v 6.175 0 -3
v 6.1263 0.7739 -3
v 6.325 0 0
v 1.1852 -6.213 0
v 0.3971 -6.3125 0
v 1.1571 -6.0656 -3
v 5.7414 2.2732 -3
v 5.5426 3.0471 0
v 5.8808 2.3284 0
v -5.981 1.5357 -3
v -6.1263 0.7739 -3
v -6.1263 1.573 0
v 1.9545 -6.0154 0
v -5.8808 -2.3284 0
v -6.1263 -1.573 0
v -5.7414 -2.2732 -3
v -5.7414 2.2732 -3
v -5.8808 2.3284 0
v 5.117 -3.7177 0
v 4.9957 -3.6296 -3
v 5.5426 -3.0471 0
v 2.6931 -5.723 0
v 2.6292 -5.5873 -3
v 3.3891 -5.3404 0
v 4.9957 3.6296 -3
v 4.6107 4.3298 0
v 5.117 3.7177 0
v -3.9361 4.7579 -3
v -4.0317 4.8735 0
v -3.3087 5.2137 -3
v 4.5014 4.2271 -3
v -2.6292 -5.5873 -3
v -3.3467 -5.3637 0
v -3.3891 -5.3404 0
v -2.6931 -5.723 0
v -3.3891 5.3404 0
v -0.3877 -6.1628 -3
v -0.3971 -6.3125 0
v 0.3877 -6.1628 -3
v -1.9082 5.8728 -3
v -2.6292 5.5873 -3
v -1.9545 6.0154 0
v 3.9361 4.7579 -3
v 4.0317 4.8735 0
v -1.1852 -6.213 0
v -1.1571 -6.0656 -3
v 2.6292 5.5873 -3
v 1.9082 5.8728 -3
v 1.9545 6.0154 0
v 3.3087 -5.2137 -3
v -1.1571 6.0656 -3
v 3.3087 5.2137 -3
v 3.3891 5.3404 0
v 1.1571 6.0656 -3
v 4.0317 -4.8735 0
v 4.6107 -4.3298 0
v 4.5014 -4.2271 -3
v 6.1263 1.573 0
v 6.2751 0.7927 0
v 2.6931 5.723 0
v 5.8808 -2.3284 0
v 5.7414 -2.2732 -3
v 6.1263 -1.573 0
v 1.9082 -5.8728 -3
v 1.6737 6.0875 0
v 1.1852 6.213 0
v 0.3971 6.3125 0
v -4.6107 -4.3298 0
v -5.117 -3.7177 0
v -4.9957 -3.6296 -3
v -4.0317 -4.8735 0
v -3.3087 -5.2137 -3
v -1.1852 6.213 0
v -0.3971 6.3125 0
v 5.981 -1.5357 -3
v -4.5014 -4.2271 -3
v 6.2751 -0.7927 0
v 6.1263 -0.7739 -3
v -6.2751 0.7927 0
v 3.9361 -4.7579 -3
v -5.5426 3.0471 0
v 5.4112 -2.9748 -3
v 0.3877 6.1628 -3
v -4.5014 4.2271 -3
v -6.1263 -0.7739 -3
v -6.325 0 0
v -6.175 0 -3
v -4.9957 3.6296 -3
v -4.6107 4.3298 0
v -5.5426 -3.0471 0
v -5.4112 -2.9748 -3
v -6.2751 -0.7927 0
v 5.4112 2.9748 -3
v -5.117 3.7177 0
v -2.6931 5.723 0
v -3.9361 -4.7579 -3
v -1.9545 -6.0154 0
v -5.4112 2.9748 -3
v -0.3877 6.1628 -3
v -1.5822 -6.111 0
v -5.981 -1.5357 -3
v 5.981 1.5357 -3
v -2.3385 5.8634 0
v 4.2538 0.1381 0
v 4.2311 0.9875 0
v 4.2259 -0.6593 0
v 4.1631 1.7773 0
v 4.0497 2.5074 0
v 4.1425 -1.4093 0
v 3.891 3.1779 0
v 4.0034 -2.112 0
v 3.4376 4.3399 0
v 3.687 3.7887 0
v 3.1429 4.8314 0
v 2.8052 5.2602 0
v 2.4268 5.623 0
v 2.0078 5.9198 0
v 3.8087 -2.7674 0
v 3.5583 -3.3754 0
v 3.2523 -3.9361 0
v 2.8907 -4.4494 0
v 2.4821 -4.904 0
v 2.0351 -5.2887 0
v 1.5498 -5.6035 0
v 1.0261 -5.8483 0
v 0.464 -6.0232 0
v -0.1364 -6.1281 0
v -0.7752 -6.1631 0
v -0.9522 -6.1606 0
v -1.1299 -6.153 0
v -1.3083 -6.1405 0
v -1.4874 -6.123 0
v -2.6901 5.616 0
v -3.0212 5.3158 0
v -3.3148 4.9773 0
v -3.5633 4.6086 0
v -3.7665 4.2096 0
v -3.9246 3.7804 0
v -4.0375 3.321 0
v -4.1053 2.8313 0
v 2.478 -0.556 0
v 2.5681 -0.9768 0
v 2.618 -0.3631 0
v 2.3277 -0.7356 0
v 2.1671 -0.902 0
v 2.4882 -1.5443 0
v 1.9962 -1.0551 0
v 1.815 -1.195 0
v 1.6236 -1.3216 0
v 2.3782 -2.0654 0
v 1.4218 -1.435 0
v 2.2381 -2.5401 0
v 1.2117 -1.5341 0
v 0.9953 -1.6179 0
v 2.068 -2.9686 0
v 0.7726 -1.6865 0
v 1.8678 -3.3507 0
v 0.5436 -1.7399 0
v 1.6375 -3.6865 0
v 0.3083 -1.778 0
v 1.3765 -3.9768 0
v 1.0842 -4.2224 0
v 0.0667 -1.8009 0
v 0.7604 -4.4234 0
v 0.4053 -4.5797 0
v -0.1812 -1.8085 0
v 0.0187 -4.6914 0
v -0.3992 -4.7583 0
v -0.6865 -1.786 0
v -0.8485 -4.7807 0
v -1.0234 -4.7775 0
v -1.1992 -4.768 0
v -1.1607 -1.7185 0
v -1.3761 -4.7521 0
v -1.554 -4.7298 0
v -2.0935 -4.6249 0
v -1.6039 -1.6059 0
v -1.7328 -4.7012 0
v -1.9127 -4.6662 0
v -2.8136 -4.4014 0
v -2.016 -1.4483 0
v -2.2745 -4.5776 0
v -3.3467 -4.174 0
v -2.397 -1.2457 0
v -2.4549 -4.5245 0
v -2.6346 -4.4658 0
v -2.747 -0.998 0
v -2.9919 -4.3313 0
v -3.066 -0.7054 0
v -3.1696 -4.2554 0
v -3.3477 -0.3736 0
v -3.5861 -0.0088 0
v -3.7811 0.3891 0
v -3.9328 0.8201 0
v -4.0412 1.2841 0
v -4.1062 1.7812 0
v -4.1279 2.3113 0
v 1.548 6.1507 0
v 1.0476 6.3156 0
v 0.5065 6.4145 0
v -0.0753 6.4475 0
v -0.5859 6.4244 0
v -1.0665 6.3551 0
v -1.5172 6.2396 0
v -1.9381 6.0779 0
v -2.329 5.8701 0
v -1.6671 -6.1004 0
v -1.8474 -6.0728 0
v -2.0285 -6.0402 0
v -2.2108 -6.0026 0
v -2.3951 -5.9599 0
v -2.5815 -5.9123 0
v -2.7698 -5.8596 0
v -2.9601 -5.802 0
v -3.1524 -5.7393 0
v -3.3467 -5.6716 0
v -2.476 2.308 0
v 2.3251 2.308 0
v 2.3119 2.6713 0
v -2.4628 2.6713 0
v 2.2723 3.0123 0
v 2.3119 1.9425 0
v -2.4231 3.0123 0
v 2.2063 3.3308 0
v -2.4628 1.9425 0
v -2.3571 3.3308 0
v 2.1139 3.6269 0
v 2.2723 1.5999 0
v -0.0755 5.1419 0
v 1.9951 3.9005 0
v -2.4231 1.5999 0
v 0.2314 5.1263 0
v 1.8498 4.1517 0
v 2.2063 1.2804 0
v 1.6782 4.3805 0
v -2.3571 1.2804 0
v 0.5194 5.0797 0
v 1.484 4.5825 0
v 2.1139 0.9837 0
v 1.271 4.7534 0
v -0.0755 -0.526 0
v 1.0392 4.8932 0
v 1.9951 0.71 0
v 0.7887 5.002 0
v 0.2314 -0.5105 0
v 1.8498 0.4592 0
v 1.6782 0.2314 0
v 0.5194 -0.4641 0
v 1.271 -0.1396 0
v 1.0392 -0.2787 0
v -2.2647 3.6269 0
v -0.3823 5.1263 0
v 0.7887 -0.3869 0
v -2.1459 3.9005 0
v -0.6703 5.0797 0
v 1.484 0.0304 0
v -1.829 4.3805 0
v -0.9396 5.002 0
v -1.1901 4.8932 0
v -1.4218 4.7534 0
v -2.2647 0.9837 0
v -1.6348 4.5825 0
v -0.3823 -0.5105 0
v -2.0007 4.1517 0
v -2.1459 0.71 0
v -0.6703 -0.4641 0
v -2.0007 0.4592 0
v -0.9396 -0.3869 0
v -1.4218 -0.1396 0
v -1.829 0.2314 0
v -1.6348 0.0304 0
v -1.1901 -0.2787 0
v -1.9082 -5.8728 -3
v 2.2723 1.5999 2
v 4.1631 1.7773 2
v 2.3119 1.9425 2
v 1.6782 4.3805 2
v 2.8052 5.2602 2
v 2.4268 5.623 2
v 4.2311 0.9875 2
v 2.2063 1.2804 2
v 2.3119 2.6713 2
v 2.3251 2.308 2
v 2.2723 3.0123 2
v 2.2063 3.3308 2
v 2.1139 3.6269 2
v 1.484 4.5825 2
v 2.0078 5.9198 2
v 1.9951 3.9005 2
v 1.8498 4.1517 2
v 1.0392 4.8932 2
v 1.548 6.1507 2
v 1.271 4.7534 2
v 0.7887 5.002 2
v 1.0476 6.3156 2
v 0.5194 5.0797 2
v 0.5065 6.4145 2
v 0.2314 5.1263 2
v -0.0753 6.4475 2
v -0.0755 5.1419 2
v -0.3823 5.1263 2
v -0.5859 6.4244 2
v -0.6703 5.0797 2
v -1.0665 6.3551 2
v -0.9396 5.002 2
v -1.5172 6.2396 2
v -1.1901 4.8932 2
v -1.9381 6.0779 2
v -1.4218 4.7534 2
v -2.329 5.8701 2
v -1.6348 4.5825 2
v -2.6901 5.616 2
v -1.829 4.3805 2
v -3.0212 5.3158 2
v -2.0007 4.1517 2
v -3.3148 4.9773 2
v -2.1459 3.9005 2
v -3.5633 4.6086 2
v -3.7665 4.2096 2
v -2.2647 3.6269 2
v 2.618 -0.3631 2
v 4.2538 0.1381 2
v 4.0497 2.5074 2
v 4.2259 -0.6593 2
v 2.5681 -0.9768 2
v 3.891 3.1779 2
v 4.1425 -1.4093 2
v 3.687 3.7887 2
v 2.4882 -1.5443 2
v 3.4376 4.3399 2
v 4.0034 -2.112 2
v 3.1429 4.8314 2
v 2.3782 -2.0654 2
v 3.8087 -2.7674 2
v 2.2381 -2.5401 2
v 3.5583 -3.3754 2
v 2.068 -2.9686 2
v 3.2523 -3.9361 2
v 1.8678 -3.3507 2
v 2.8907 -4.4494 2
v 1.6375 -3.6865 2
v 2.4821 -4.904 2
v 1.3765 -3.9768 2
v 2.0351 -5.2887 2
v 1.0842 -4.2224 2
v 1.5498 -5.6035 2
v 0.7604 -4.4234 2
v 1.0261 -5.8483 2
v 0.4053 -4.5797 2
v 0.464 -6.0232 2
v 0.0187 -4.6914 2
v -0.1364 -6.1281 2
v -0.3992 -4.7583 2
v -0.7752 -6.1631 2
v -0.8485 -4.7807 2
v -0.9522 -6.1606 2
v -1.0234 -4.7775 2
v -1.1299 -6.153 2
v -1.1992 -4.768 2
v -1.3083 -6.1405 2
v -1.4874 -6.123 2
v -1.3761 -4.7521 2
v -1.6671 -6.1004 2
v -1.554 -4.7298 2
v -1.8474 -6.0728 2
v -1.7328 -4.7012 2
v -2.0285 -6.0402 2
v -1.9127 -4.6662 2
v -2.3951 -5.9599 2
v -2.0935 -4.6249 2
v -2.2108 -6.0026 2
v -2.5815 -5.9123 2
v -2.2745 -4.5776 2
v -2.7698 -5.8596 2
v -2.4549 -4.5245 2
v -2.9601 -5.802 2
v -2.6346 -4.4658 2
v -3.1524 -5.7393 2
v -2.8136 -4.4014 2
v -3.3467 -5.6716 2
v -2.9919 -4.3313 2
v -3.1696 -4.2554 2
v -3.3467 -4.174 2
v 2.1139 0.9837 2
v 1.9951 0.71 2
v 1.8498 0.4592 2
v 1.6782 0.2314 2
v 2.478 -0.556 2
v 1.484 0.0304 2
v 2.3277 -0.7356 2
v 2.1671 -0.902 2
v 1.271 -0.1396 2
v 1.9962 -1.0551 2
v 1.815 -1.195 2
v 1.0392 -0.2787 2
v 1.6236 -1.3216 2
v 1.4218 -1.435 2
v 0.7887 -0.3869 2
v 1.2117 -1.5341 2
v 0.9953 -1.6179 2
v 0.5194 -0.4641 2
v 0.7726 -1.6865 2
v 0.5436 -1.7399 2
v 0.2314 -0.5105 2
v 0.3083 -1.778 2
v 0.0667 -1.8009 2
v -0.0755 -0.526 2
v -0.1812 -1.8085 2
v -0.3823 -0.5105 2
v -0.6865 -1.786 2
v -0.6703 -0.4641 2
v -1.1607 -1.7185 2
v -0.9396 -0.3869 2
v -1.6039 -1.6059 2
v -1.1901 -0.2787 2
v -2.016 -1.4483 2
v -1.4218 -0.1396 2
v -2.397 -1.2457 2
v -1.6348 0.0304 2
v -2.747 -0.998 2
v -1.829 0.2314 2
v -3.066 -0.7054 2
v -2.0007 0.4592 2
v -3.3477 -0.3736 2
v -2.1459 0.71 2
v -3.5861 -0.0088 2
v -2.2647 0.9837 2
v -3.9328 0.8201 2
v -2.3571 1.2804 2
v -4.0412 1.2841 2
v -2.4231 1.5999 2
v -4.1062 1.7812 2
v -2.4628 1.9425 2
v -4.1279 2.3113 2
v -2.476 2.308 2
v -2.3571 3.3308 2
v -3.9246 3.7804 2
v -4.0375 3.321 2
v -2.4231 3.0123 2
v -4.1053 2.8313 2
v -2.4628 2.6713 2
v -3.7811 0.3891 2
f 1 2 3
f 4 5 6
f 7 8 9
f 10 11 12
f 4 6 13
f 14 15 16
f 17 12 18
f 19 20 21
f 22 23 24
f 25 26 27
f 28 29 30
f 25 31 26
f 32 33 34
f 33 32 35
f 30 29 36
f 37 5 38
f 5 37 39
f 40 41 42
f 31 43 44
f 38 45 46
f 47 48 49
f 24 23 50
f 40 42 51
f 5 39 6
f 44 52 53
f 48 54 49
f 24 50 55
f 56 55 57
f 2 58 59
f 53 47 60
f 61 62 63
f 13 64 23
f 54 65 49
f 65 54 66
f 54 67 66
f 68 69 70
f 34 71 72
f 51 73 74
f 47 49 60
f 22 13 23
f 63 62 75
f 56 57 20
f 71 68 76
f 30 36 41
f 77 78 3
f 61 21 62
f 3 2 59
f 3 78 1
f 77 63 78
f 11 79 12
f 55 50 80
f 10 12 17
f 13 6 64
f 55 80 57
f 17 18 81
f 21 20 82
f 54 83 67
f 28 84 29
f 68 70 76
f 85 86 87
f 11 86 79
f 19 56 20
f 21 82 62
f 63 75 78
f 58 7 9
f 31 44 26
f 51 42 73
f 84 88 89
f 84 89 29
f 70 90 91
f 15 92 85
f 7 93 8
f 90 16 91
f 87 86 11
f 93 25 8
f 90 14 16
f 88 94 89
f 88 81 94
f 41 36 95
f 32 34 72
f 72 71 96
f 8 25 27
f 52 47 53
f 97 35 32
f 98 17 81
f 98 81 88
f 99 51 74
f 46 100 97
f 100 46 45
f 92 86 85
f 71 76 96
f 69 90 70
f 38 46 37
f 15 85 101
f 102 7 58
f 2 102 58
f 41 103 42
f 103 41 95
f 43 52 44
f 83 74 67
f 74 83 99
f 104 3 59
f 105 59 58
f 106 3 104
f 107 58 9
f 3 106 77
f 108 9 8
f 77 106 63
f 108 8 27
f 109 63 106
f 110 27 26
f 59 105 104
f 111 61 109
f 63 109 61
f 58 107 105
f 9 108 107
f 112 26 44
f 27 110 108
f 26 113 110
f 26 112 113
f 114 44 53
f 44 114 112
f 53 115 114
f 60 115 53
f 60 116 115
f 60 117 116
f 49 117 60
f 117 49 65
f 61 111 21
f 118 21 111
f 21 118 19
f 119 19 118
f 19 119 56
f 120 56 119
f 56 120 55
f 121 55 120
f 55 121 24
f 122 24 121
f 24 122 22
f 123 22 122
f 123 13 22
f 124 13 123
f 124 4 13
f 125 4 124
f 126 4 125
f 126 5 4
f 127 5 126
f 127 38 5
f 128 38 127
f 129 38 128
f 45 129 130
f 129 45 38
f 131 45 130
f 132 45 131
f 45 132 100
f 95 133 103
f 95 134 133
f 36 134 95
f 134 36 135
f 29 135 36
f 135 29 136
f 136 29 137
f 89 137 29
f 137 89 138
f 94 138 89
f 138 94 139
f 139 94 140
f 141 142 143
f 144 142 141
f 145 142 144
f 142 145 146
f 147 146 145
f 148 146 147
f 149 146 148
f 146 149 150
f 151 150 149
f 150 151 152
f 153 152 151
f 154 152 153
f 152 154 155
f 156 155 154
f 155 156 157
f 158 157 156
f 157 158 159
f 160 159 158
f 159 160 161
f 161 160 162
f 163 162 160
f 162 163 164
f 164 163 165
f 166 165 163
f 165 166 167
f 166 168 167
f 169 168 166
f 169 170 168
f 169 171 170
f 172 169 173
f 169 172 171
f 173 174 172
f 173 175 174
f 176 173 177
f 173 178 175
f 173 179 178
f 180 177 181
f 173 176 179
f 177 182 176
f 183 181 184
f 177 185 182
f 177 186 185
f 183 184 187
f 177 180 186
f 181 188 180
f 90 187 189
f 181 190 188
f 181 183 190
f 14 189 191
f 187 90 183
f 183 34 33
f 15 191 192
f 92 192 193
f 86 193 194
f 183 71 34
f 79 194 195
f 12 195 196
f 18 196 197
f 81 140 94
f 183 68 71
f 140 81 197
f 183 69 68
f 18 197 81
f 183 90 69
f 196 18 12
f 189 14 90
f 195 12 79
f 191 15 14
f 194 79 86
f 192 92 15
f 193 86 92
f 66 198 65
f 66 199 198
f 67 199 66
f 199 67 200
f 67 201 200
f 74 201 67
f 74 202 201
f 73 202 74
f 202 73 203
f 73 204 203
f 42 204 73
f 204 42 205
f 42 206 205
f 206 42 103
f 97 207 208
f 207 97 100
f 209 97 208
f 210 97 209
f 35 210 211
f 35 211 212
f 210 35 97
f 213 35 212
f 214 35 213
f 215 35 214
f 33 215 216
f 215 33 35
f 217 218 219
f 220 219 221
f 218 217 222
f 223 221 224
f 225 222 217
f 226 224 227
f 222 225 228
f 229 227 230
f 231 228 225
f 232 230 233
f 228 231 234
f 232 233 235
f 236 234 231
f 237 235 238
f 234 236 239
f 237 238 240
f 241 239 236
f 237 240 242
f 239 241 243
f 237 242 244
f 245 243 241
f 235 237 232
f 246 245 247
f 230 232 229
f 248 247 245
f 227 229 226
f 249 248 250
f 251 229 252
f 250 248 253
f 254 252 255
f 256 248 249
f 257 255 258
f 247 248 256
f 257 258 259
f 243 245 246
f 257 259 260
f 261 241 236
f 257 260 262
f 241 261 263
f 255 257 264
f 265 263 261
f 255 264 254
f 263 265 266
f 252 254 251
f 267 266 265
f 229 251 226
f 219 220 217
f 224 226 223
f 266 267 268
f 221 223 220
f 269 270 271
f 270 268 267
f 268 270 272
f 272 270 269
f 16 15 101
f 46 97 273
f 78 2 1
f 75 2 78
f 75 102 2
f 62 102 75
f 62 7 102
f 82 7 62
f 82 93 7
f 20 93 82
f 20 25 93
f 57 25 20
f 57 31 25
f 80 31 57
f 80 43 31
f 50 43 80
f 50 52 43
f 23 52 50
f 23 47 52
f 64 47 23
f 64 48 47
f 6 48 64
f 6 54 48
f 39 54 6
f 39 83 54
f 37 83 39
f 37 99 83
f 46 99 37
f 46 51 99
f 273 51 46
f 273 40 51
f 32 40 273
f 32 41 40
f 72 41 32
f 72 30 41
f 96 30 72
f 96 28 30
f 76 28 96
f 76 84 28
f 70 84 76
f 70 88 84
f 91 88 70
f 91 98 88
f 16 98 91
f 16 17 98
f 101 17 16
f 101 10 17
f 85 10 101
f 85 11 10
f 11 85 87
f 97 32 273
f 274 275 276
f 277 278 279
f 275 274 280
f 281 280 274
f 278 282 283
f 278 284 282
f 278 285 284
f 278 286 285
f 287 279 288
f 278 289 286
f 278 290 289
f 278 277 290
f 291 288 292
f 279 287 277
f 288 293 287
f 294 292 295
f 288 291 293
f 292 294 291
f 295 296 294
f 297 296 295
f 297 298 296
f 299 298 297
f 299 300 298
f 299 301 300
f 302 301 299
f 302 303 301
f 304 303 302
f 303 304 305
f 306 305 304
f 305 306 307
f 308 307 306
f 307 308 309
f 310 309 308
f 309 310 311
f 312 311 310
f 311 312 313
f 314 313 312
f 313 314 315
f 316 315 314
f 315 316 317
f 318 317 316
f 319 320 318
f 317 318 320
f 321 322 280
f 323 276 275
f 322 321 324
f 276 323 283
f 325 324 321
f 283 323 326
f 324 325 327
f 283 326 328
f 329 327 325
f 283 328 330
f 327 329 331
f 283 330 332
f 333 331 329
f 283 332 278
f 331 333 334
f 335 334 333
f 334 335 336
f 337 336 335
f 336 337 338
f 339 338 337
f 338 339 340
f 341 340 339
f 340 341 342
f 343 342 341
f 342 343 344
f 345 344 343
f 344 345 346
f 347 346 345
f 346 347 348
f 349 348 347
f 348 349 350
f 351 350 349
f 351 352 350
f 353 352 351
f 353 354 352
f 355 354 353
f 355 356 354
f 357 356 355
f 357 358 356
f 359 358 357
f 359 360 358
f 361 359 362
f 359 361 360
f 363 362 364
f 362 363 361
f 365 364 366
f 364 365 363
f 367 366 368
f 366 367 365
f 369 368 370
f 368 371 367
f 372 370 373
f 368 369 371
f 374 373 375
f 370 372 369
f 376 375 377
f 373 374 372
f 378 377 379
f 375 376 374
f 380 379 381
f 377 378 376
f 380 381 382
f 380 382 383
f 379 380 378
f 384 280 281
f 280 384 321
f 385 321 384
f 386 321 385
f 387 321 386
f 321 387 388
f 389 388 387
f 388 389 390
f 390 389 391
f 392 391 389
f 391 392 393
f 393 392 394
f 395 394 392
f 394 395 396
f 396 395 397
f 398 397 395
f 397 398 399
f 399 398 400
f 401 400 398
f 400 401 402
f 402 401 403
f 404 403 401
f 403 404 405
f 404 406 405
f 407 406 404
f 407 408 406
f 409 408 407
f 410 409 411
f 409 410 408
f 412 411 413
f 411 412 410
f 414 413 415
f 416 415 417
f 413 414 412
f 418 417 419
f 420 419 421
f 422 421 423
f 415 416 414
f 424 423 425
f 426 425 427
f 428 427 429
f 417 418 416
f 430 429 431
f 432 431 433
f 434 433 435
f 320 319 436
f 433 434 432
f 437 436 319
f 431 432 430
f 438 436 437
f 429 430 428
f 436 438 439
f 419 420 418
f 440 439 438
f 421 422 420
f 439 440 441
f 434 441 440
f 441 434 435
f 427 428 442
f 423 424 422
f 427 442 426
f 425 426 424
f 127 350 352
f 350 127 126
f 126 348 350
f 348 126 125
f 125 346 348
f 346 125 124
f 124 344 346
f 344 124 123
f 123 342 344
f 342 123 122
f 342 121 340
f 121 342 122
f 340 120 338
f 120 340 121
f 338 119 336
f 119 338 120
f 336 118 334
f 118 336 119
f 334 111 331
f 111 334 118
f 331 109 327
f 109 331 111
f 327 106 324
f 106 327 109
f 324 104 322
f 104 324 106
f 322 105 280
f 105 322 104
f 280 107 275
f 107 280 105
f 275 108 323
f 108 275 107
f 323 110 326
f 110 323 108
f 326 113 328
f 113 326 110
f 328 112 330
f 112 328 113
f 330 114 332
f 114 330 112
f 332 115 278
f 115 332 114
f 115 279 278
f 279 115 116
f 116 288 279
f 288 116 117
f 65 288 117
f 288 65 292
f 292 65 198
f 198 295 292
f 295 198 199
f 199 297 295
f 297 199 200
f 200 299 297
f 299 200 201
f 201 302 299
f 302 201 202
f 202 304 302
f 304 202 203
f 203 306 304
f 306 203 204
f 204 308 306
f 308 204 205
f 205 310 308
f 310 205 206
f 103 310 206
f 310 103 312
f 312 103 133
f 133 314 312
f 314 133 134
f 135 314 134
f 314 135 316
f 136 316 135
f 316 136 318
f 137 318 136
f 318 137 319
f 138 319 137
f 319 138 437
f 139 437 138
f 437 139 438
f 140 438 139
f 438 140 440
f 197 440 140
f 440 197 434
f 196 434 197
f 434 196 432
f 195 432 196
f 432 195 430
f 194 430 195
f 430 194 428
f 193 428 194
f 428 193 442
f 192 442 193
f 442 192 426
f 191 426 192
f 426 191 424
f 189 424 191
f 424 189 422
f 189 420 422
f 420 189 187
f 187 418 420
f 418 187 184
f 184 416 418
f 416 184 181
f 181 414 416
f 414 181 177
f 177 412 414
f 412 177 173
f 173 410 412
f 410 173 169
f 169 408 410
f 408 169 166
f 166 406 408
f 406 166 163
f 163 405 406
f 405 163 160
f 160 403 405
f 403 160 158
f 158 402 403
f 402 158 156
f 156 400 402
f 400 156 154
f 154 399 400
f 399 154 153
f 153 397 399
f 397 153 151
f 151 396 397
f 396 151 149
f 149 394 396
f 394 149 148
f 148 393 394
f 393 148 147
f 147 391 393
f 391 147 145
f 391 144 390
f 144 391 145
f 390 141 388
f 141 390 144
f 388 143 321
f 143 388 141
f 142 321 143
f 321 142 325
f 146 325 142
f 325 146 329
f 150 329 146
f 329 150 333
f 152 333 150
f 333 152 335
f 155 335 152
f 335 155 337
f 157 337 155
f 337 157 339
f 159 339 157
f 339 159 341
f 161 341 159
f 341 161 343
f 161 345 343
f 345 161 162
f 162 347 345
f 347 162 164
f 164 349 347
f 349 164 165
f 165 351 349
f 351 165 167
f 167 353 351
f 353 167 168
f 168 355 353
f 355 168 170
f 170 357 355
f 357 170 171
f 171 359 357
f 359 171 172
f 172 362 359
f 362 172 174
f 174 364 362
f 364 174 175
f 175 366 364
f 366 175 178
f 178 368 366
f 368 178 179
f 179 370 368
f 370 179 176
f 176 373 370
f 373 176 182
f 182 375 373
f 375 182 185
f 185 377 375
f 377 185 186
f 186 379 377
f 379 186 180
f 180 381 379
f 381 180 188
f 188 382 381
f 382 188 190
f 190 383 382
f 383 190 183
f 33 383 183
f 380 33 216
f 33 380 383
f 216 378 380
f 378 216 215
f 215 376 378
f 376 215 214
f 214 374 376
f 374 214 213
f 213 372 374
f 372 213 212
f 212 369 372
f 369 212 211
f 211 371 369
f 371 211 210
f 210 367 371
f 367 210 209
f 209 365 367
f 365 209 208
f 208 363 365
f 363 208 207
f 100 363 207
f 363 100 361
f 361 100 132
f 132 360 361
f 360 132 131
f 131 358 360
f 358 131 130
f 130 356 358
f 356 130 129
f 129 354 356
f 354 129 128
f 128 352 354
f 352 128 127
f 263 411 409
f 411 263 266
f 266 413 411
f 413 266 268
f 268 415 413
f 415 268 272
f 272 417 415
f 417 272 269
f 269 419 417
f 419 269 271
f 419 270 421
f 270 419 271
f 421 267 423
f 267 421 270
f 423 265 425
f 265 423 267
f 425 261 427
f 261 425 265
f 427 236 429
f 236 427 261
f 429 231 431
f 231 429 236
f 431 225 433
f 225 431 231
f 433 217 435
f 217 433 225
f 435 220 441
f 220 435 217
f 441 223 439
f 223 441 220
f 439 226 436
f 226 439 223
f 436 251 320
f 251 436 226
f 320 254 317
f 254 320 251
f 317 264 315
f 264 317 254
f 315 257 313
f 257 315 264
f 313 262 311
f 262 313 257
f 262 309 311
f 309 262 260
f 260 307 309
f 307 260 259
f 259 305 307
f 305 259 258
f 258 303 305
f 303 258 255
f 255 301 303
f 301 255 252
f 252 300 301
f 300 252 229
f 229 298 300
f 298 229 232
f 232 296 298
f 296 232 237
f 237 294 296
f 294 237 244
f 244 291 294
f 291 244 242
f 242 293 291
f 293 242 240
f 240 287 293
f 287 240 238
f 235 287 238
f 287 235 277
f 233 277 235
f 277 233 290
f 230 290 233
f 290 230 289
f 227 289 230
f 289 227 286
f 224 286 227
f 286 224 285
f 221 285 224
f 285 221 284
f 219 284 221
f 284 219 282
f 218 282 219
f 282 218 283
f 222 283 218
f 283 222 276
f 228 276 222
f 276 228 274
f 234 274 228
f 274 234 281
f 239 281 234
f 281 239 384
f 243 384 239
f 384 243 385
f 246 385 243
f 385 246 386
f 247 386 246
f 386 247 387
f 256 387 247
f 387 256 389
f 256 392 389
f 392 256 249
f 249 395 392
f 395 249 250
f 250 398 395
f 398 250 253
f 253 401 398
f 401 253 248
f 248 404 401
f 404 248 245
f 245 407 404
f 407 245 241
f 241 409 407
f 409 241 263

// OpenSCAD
$fn = 50;

difference() {
	union() {
		translate(v = [0, 0, -3.0]) {
			cylinder(h = 3, r1 = 6.175, r2 = 6.325);
		}
		linear_extrude(height = 2) {
			text(font = "Impact", halign = "center", size = 12, text = "9", valign = "center");
		}
	}
	union();
}
